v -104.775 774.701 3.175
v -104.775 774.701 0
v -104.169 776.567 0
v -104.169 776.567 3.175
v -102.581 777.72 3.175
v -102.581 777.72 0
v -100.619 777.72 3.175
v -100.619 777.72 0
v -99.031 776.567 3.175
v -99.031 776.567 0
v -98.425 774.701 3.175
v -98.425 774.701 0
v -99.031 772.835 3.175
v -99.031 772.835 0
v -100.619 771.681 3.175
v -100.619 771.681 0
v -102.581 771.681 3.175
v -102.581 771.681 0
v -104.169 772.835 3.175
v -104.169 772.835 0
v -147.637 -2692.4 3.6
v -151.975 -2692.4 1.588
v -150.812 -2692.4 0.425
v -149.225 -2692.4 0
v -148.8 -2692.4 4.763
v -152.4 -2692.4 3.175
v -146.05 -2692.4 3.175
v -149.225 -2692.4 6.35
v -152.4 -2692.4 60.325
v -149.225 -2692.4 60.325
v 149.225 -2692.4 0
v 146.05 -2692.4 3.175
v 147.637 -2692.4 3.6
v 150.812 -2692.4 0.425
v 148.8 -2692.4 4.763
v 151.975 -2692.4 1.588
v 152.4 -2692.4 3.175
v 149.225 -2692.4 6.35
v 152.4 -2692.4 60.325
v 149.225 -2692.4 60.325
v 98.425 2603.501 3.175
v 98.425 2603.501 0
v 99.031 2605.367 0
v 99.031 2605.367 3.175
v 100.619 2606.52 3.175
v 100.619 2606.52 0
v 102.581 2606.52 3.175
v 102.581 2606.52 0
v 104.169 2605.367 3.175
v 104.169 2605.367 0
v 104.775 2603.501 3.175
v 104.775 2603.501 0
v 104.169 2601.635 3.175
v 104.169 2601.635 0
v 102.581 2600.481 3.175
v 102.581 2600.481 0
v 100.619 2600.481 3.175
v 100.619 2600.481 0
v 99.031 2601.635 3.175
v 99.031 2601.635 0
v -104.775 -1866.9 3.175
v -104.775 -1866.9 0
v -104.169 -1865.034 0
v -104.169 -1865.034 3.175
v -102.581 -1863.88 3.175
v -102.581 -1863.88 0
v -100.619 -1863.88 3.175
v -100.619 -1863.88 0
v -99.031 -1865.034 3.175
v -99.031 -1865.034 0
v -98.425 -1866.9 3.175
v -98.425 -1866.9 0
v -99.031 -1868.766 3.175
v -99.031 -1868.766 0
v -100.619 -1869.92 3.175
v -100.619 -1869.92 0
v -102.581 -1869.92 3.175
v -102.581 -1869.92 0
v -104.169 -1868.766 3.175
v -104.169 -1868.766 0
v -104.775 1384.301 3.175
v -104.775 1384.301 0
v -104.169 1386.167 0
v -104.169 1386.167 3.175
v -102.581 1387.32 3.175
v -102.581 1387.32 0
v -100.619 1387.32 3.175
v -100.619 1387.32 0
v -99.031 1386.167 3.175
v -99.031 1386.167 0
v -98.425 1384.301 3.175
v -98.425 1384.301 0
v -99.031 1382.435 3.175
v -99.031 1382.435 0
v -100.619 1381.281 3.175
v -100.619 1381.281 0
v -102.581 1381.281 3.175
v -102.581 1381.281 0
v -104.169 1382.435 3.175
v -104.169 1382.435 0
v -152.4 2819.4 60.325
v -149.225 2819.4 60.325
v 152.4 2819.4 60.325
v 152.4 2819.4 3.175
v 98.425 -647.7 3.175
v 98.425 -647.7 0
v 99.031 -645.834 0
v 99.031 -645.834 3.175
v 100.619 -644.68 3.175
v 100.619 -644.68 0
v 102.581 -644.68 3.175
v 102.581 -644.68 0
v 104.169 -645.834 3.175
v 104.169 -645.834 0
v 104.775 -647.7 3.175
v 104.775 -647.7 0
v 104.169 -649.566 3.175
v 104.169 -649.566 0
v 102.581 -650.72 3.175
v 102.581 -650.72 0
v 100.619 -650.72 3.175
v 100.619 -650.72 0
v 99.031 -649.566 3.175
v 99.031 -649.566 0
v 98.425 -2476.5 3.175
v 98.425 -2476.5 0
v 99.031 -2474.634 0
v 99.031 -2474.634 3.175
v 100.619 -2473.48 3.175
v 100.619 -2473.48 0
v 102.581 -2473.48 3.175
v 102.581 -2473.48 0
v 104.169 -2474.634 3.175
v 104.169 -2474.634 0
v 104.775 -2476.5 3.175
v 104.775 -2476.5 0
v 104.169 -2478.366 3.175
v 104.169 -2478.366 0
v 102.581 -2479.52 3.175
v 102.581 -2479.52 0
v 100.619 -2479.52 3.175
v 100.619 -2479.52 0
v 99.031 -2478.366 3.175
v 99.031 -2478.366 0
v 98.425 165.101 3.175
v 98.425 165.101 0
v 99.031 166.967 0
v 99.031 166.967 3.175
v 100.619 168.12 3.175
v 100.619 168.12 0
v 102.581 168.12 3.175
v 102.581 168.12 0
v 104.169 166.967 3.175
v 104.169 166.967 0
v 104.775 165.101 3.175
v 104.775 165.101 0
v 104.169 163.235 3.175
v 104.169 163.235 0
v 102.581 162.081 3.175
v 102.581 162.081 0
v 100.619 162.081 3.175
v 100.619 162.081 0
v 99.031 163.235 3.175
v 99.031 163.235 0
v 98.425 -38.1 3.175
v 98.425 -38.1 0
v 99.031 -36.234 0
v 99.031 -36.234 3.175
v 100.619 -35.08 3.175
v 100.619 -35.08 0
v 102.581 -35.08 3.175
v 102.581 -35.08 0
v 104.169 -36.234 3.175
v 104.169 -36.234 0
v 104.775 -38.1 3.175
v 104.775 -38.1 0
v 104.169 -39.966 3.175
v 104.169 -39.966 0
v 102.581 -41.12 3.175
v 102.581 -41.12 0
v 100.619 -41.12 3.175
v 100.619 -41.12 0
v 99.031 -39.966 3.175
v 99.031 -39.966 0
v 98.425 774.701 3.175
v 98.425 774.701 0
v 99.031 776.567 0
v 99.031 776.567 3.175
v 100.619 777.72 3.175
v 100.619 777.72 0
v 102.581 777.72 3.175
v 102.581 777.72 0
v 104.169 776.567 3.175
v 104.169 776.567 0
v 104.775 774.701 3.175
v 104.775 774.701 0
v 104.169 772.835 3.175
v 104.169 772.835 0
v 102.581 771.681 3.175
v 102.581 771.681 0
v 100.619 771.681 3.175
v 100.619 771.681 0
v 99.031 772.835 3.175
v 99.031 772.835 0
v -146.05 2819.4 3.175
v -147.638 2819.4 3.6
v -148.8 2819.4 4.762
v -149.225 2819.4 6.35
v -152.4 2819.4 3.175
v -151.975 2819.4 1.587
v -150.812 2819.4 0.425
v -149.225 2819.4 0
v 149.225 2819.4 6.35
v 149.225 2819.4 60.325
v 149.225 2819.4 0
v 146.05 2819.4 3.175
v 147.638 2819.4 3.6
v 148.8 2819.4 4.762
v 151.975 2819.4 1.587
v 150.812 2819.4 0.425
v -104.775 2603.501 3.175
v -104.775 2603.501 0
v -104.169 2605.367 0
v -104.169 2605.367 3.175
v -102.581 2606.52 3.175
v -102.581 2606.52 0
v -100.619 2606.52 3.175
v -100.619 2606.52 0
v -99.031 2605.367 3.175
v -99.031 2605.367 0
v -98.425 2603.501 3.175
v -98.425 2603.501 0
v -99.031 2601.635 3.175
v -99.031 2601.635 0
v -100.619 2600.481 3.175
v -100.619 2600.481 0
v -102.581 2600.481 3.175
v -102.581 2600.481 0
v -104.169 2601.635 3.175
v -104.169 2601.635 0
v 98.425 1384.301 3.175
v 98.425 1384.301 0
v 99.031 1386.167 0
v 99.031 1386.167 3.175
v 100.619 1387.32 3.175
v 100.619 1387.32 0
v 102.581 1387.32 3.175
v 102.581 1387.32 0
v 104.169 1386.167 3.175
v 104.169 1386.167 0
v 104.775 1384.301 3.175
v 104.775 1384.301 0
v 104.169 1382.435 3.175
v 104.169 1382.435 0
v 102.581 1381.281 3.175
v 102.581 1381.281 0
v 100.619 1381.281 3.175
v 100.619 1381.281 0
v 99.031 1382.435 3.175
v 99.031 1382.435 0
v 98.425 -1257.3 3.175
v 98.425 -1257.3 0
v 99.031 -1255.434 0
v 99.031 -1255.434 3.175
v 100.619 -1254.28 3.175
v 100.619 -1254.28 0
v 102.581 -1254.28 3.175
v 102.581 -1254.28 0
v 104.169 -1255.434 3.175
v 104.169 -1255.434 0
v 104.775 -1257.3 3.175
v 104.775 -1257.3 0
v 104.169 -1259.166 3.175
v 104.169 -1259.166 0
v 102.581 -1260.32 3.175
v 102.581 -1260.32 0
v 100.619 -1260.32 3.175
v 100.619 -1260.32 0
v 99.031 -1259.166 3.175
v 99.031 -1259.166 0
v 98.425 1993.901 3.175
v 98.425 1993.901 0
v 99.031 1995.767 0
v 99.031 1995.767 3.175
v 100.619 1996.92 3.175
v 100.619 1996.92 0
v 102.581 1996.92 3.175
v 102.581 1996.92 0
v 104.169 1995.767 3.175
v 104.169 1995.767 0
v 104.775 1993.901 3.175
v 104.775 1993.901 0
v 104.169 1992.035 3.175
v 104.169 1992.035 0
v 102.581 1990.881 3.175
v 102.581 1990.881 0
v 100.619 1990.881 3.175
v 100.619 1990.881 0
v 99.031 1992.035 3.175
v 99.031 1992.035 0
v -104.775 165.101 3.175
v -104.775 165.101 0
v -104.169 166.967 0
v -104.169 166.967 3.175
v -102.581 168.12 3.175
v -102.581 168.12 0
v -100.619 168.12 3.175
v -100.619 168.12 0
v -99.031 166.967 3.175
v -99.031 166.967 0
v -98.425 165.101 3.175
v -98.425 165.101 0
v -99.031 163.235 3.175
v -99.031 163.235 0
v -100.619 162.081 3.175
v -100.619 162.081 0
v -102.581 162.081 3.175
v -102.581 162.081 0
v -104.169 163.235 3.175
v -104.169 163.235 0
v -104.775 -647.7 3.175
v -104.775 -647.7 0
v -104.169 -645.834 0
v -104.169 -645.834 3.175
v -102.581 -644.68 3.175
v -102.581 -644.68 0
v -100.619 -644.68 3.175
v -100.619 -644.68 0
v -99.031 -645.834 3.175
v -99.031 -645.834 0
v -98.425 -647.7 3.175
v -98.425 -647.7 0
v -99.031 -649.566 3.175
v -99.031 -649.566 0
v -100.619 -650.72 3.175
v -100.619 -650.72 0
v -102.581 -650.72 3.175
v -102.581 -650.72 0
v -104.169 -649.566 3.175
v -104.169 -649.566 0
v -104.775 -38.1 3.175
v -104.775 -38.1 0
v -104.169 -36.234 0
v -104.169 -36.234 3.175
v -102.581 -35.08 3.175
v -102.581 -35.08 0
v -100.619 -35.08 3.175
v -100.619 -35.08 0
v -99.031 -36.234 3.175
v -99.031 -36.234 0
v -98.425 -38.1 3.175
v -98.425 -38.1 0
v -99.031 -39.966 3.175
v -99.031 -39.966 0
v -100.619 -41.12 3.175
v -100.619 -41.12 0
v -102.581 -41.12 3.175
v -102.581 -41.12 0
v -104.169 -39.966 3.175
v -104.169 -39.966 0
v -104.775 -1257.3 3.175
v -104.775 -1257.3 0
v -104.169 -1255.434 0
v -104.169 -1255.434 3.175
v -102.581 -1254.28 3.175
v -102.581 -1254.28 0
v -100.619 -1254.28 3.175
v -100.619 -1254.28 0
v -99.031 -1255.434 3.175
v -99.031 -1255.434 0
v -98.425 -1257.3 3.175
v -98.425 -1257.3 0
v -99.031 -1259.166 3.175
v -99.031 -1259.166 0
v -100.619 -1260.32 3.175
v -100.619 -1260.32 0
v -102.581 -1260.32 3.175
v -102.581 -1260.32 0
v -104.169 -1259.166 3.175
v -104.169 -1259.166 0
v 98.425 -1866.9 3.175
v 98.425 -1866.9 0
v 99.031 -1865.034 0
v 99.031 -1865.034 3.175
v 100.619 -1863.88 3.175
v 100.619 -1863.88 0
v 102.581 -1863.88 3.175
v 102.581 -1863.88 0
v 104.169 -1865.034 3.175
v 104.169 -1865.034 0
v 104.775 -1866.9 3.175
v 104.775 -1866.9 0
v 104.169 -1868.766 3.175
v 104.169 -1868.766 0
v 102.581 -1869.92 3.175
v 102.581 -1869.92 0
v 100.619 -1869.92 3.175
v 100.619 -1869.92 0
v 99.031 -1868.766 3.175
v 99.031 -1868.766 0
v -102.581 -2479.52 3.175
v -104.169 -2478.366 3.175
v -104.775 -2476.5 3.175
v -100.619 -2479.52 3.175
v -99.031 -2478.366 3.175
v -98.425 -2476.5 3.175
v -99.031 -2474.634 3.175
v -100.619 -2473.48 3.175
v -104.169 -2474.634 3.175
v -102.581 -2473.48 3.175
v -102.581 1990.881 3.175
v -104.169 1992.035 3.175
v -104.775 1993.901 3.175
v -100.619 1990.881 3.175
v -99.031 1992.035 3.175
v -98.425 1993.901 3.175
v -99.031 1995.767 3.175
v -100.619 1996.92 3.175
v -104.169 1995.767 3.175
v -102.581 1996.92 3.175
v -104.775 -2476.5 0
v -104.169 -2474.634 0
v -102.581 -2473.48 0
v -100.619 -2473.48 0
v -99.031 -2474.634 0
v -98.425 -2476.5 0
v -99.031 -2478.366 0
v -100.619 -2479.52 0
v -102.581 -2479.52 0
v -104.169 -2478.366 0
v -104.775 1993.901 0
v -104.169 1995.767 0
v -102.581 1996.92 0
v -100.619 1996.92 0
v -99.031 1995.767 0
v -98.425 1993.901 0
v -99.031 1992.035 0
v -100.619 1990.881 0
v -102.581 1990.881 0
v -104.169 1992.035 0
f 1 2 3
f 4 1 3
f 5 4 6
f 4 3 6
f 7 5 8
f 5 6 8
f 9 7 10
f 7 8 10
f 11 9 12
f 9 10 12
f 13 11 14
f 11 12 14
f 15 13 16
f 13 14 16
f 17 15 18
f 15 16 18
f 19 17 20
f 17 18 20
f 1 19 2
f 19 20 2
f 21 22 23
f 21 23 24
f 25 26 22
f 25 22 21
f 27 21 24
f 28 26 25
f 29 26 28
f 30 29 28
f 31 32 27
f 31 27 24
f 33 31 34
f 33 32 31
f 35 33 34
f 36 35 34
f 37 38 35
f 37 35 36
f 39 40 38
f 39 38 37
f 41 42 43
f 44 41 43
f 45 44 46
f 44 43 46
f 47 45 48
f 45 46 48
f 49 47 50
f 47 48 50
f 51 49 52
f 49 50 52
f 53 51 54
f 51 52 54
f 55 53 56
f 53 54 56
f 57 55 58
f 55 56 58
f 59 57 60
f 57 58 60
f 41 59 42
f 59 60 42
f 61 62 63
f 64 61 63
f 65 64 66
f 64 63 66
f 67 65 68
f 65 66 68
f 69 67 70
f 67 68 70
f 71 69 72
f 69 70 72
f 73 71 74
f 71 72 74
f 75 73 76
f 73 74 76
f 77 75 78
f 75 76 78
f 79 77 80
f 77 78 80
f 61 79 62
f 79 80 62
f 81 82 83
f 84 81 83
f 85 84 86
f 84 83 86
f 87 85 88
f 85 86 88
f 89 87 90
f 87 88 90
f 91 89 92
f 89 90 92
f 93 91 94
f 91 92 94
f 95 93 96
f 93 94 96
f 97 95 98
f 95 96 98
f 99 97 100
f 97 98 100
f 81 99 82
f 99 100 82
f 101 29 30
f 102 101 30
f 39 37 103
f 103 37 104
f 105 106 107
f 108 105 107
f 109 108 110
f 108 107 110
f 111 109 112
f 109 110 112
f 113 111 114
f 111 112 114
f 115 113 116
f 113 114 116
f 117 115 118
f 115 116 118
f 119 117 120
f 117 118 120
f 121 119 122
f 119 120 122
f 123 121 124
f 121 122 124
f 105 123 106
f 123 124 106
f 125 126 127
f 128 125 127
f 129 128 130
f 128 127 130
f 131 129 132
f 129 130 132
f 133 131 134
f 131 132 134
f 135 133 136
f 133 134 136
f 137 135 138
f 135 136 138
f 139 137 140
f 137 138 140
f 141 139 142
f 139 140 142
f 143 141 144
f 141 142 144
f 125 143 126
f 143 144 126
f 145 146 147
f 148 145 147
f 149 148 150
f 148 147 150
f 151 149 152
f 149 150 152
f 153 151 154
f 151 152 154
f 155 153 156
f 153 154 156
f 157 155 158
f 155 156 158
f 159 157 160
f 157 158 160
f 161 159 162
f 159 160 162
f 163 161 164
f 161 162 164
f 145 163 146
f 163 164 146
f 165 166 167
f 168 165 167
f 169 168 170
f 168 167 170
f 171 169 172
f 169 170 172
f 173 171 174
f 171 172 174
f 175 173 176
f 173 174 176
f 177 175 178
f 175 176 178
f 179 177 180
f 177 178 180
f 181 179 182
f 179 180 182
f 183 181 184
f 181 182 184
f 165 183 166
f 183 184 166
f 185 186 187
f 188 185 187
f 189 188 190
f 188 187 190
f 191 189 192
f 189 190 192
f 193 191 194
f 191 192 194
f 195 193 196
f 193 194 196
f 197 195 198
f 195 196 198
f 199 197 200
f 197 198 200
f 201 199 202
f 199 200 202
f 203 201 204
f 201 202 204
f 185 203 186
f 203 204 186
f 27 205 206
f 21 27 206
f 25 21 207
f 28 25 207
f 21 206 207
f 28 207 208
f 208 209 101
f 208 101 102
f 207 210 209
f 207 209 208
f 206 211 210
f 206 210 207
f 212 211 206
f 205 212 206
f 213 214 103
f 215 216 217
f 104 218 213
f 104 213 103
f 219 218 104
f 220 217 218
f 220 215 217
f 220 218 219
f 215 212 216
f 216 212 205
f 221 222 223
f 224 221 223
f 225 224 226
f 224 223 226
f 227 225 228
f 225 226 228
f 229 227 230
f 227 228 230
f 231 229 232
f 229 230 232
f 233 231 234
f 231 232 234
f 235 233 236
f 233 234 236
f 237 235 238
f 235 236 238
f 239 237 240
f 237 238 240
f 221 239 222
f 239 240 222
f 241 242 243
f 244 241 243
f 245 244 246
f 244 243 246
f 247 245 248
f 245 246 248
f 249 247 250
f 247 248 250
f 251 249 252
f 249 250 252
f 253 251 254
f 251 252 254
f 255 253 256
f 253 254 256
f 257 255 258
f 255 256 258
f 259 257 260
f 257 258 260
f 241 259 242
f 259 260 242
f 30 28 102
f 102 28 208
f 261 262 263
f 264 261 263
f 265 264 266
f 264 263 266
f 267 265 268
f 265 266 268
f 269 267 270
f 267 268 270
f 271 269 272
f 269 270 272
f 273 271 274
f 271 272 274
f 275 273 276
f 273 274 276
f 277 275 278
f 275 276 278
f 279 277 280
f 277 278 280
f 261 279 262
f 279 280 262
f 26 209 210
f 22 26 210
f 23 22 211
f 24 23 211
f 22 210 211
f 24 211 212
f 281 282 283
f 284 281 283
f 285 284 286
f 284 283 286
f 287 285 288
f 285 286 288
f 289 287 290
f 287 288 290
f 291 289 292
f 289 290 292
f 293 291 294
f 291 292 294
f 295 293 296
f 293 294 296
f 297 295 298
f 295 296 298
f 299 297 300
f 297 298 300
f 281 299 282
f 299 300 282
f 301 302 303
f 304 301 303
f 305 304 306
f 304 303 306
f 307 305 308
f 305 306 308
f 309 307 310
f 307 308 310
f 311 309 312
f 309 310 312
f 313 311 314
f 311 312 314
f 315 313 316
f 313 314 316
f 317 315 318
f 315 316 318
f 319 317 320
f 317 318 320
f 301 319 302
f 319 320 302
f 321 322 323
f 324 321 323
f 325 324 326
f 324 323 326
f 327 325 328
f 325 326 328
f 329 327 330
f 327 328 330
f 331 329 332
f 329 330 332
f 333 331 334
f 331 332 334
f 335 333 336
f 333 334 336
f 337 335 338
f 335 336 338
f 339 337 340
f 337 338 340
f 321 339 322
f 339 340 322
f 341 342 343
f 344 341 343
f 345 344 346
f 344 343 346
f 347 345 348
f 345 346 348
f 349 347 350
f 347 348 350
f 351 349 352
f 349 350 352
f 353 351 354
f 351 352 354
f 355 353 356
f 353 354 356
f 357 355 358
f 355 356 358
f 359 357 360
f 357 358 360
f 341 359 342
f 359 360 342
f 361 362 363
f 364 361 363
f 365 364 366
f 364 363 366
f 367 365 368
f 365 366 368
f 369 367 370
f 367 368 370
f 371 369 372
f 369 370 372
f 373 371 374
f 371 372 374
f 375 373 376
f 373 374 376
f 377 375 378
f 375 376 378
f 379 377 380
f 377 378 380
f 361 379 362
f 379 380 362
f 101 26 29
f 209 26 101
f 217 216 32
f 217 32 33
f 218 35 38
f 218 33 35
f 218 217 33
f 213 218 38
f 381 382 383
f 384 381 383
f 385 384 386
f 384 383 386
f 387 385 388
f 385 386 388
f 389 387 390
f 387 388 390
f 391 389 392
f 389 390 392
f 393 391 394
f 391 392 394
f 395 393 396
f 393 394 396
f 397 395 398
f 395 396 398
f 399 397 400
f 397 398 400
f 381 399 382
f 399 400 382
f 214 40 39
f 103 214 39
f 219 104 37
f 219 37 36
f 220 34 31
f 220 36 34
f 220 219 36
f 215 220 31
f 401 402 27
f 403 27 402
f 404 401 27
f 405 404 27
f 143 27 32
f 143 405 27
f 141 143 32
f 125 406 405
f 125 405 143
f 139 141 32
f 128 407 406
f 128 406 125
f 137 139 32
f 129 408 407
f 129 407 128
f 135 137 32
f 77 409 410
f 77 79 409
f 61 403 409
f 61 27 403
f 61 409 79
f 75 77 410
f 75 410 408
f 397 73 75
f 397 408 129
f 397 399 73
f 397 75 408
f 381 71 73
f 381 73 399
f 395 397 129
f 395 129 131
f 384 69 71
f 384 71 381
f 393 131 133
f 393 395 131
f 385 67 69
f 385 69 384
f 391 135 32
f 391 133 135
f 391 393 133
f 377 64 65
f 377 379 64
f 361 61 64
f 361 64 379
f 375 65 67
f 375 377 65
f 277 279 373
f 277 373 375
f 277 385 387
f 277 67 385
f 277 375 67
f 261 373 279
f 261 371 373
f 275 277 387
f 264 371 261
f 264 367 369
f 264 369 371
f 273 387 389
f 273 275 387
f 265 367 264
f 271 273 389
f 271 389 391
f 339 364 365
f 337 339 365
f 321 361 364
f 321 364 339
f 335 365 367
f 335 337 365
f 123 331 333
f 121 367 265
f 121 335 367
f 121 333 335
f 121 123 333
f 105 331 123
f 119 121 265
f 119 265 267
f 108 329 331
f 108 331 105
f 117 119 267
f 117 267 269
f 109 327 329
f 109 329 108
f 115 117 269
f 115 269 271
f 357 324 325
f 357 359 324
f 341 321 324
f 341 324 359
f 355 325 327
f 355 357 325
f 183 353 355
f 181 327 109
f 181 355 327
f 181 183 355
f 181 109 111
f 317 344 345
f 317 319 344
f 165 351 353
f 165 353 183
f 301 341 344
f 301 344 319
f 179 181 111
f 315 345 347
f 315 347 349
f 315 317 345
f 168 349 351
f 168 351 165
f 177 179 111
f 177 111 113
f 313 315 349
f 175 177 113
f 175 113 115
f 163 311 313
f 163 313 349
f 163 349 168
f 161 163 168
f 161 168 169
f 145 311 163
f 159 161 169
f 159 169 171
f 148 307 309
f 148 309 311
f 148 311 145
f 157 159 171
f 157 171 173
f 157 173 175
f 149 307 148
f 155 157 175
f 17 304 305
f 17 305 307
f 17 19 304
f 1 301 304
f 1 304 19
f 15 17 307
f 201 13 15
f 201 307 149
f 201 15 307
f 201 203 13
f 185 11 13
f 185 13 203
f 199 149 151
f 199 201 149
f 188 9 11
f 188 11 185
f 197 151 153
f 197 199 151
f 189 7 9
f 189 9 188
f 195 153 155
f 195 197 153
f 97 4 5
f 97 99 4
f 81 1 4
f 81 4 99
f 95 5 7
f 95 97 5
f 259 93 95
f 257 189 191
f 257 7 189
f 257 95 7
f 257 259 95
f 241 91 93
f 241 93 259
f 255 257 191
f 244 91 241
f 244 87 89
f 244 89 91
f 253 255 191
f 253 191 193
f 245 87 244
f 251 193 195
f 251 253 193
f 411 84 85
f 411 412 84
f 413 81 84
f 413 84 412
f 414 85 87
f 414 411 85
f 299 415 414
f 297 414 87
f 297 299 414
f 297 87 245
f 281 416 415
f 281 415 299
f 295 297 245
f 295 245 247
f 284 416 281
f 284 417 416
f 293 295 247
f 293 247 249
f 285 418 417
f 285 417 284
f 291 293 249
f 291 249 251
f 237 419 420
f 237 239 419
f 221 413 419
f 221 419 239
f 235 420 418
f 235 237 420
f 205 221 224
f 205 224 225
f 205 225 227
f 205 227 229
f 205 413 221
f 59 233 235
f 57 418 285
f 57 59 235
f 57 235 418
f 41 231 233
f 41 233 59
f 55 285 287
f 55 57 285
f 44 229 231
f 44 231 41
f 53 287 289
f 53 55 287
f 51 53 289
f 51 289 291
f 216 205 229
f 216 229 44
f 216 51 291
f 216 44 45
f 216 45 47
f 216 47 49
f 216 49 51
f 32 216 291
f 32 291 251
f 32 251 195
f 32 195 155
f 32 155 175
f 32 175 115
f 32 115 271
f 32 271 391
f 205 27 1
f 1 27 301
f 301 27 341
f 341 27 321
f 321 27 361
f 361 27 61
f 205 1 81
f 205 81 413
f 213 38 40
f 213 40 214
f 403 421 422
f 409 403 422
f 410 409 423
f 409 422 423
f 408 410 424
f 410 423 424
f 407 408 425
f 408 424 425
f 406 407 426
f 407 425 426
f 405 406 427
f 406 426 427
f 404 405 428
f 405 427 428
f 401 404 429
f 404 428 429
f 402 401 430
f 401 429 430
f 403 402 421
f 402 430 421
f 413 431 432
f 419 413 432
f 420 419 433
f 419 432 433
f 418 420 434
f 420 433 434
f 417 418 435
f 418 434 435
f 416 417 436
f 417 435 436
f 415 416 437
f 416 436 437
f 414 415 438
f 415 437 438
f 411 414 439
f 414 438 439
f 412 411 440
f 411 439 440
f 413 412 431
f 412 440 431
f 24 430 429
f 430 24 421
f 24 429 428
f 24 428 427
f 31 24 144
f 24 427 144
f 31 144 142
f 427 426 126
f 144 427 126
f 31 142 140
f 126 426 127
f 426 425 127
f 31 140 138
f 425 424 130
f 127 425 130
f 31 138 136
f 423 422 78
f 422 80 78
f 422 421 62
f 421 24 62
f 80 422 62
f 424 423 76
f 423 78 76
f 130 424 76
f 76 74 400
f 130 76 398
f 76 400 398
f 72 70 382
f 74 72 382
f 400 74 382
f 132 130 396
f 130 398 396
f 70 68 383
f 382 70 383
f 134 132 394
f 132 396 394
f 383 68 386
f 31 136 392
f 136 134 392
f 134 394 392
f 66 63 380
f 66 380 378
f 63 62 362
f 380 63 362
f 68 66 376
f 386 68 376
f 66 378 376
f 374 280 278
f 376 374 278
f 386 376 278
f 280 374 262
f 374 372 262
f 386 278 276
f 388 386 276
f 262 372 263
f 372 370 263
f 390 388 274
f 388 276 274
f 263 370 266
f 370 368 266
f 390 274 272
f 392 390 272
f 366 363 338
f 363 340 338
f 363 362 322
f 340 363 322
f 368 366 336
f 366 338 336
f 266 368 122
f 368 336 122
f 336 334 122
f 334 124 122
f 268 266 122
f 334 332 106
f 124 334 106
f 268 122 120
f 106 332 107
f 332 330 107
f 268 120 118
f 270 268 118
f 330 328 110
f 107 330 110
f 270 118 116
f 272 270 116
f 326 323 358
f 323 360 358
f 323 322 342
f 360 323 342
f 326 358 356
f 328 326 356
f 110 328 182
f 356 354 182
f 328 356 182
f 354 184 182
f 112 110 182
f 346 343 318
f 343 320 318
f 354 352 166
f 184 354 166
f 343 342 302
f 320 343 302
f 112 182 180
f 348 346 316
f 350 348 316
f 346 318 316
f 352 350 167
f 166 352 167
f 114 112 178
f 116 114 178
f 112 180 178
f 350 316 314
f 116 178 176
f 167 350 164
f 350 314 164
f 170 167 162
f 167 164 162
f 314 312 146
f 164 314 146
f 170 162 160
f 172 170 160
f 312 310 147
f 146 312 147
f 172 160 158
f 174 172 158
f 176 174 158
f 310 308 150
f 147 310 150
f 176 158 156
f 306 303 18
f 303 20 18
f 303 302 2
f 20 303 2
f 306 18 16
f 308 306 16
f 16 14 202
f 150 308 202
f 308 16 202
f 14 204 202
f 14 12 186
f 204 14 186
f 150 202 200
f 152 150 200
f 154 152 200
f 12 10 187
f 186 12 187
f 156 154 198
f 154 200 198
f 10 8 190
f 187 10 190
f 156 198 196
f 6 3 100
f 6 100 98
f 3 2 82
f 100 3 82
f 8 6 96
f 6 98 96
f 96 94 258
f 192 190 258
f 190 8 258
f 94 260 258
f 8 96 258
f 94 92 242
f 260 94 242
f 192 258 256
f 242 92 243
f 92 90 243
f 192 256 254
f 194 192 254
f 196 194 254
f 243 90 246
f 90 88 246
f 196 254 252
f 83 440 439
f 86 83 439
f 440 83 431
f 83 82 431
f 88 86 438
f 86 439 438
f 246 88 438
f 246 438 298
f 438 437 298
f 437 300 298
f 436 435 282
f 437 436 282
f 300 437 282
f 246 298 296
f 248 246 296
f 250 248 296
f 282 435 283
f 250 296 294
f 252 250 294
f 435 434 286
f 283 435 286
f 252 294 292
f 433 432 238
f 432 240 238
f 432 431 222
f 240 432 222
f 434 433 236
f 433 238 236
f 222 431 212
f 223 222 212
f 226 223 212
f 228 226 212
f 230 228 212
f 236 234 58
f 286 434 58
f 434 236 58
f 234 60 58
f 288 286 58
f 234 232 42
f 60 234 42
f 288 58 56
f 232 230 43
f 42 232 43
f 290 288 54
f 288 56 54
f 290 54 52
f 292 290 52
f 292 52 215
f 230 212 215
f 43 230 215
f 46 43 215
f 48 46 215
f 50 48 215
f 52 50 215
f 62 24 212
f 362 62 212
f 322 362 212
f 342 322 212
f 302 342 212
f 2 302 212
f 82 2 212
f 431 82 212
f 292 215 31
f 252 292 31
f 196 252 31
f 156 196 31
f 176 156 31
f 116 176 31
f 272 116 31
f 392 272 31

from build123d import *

# Parameters (mm, degrees)
F0_W     = 304.8
F0_H     = 5638.8
F1_DEPTH = 3.175
F2_W     = 3.175
F2_H     = 5638.8
F3_DEPTH = 57.15
F4_W     = 3.175
F4_H     = 5638.8
F5_DEPTH = 57.15
F6_R     = 3.175
F7_R     = 3.175
F8_DEPTH = 127
F11_D    = 6.35
F13_D    = 6.35


with BuildPart() as f1:
    # F0 (on Top) → F1 (new body)
    with BuildSketch(Plane.XY):
        Rectangle(F0_W, F0_H)
    extrude(amount=F1_DEPTH)

    # F2 (on face) → F3 (join)
    with BuildSketch(Plane.XY.offset(3.175)):
        with Locations((150.8125, 0)):
            Rectangle(F2_W, F2_H)
    extrude(amount=F3_DEPTH)

    # F4 (on face) → F5 (join)
    with BuildSketch(Plane.XY.offset(3.175)):
        with Locations((-150.8125, 0)):
            Rectangle(F4_W, F4_H)
    extrude(amount=F5_DEPTH)

    # F6
    f6_edges = [f1.edges().sort_by_distance(p)[0] for p in [
        (-149.225, 0, 3.175),
        (152.4, 0, 0),
    ]]
    fillet(f6_edges, radius=F6_R)

    # F7
    f7_edges = [f1.edges().sort_by_distance(p)[0] for p in [
        (149.225, 0, 3.175),
        (-152.4, 0, 0),
    ]]
    fillet(f7_edges, radius=F7_R)

    # F5_face (on face) → F8 (cut)
    with BuildSketch(Plane(origin=(0, -2819.4, 9.82396), x_dir=(1, 0, 0), z_dir=(0, -1, 0))):
        with BuildLine():
            Line((146.05, -6.64896), (-146.05, -6.64896))
            ThreePointArc((-146.05, -6.64896), (-148.295064, -5.719024), (-149.225, -3.47396))
            Line((-149.225, -3.47396), (-149.225, 50.50104))
            Line((-149.225, 50.50104), (-152.4, 50.50104))
            Line((-152.4, 50.50104), (-152.4, -6.64896))
            ThreePointArc((-152.4, -6.64896), (-151.470064, -8.894024), (-149.225, -9.82396))
            Line((-149.225, -9.82396), (149.225, -9.82396))
            ThreePointArc((149.225, -9.82396), (151.470064, -8.894024), (152.4, -6.64896))
            Line((152.4, -6.64896), (152.4, 50.50104))
            Line((152.4, 50.50104), (149.225, 50.50104))
            Line((149.225, 50.50104), (149.225, -3.47396))
            ThreePointArc((149.225, -3.47396), (148.295064, -5.719024), (146.05, -6.64896))
        make_face()
    extrude(amount=-F8_DEPTH, mode=Mode.SUBTRACT)

    # F11 (through all)
    with Locations(Plane.XY.offset(3.175)):
        with Locations((-101.6, 2603.500732), (101.6, 2603.500732), (101.6, 1993.900732), (-101.6, 1993.900732), (-101.6, 1384.300732), (101.6, 1384.300732), (101.6, 774.700732), (-101.6, 774.700732), (-101.6, 165.100732), (101.6, 165.100732)):
            Hole(F11_D / 2)

    # F13 (through all)
    with Locations(Plane.XY.offset(3.175)):
        with Locations((-101.6, -38.1), (101.6, -38.1), (101.6, -647.7), (-101.6, -647.7), (-101.6, -1257.3), (101.6, -1257.3), (101.6, -1866.9), (-101.6, -1866.9), (-101.6, -2476.5), (101.6, -2476.5)):
            Hole(F13_D / 2)


solid = f1.part
